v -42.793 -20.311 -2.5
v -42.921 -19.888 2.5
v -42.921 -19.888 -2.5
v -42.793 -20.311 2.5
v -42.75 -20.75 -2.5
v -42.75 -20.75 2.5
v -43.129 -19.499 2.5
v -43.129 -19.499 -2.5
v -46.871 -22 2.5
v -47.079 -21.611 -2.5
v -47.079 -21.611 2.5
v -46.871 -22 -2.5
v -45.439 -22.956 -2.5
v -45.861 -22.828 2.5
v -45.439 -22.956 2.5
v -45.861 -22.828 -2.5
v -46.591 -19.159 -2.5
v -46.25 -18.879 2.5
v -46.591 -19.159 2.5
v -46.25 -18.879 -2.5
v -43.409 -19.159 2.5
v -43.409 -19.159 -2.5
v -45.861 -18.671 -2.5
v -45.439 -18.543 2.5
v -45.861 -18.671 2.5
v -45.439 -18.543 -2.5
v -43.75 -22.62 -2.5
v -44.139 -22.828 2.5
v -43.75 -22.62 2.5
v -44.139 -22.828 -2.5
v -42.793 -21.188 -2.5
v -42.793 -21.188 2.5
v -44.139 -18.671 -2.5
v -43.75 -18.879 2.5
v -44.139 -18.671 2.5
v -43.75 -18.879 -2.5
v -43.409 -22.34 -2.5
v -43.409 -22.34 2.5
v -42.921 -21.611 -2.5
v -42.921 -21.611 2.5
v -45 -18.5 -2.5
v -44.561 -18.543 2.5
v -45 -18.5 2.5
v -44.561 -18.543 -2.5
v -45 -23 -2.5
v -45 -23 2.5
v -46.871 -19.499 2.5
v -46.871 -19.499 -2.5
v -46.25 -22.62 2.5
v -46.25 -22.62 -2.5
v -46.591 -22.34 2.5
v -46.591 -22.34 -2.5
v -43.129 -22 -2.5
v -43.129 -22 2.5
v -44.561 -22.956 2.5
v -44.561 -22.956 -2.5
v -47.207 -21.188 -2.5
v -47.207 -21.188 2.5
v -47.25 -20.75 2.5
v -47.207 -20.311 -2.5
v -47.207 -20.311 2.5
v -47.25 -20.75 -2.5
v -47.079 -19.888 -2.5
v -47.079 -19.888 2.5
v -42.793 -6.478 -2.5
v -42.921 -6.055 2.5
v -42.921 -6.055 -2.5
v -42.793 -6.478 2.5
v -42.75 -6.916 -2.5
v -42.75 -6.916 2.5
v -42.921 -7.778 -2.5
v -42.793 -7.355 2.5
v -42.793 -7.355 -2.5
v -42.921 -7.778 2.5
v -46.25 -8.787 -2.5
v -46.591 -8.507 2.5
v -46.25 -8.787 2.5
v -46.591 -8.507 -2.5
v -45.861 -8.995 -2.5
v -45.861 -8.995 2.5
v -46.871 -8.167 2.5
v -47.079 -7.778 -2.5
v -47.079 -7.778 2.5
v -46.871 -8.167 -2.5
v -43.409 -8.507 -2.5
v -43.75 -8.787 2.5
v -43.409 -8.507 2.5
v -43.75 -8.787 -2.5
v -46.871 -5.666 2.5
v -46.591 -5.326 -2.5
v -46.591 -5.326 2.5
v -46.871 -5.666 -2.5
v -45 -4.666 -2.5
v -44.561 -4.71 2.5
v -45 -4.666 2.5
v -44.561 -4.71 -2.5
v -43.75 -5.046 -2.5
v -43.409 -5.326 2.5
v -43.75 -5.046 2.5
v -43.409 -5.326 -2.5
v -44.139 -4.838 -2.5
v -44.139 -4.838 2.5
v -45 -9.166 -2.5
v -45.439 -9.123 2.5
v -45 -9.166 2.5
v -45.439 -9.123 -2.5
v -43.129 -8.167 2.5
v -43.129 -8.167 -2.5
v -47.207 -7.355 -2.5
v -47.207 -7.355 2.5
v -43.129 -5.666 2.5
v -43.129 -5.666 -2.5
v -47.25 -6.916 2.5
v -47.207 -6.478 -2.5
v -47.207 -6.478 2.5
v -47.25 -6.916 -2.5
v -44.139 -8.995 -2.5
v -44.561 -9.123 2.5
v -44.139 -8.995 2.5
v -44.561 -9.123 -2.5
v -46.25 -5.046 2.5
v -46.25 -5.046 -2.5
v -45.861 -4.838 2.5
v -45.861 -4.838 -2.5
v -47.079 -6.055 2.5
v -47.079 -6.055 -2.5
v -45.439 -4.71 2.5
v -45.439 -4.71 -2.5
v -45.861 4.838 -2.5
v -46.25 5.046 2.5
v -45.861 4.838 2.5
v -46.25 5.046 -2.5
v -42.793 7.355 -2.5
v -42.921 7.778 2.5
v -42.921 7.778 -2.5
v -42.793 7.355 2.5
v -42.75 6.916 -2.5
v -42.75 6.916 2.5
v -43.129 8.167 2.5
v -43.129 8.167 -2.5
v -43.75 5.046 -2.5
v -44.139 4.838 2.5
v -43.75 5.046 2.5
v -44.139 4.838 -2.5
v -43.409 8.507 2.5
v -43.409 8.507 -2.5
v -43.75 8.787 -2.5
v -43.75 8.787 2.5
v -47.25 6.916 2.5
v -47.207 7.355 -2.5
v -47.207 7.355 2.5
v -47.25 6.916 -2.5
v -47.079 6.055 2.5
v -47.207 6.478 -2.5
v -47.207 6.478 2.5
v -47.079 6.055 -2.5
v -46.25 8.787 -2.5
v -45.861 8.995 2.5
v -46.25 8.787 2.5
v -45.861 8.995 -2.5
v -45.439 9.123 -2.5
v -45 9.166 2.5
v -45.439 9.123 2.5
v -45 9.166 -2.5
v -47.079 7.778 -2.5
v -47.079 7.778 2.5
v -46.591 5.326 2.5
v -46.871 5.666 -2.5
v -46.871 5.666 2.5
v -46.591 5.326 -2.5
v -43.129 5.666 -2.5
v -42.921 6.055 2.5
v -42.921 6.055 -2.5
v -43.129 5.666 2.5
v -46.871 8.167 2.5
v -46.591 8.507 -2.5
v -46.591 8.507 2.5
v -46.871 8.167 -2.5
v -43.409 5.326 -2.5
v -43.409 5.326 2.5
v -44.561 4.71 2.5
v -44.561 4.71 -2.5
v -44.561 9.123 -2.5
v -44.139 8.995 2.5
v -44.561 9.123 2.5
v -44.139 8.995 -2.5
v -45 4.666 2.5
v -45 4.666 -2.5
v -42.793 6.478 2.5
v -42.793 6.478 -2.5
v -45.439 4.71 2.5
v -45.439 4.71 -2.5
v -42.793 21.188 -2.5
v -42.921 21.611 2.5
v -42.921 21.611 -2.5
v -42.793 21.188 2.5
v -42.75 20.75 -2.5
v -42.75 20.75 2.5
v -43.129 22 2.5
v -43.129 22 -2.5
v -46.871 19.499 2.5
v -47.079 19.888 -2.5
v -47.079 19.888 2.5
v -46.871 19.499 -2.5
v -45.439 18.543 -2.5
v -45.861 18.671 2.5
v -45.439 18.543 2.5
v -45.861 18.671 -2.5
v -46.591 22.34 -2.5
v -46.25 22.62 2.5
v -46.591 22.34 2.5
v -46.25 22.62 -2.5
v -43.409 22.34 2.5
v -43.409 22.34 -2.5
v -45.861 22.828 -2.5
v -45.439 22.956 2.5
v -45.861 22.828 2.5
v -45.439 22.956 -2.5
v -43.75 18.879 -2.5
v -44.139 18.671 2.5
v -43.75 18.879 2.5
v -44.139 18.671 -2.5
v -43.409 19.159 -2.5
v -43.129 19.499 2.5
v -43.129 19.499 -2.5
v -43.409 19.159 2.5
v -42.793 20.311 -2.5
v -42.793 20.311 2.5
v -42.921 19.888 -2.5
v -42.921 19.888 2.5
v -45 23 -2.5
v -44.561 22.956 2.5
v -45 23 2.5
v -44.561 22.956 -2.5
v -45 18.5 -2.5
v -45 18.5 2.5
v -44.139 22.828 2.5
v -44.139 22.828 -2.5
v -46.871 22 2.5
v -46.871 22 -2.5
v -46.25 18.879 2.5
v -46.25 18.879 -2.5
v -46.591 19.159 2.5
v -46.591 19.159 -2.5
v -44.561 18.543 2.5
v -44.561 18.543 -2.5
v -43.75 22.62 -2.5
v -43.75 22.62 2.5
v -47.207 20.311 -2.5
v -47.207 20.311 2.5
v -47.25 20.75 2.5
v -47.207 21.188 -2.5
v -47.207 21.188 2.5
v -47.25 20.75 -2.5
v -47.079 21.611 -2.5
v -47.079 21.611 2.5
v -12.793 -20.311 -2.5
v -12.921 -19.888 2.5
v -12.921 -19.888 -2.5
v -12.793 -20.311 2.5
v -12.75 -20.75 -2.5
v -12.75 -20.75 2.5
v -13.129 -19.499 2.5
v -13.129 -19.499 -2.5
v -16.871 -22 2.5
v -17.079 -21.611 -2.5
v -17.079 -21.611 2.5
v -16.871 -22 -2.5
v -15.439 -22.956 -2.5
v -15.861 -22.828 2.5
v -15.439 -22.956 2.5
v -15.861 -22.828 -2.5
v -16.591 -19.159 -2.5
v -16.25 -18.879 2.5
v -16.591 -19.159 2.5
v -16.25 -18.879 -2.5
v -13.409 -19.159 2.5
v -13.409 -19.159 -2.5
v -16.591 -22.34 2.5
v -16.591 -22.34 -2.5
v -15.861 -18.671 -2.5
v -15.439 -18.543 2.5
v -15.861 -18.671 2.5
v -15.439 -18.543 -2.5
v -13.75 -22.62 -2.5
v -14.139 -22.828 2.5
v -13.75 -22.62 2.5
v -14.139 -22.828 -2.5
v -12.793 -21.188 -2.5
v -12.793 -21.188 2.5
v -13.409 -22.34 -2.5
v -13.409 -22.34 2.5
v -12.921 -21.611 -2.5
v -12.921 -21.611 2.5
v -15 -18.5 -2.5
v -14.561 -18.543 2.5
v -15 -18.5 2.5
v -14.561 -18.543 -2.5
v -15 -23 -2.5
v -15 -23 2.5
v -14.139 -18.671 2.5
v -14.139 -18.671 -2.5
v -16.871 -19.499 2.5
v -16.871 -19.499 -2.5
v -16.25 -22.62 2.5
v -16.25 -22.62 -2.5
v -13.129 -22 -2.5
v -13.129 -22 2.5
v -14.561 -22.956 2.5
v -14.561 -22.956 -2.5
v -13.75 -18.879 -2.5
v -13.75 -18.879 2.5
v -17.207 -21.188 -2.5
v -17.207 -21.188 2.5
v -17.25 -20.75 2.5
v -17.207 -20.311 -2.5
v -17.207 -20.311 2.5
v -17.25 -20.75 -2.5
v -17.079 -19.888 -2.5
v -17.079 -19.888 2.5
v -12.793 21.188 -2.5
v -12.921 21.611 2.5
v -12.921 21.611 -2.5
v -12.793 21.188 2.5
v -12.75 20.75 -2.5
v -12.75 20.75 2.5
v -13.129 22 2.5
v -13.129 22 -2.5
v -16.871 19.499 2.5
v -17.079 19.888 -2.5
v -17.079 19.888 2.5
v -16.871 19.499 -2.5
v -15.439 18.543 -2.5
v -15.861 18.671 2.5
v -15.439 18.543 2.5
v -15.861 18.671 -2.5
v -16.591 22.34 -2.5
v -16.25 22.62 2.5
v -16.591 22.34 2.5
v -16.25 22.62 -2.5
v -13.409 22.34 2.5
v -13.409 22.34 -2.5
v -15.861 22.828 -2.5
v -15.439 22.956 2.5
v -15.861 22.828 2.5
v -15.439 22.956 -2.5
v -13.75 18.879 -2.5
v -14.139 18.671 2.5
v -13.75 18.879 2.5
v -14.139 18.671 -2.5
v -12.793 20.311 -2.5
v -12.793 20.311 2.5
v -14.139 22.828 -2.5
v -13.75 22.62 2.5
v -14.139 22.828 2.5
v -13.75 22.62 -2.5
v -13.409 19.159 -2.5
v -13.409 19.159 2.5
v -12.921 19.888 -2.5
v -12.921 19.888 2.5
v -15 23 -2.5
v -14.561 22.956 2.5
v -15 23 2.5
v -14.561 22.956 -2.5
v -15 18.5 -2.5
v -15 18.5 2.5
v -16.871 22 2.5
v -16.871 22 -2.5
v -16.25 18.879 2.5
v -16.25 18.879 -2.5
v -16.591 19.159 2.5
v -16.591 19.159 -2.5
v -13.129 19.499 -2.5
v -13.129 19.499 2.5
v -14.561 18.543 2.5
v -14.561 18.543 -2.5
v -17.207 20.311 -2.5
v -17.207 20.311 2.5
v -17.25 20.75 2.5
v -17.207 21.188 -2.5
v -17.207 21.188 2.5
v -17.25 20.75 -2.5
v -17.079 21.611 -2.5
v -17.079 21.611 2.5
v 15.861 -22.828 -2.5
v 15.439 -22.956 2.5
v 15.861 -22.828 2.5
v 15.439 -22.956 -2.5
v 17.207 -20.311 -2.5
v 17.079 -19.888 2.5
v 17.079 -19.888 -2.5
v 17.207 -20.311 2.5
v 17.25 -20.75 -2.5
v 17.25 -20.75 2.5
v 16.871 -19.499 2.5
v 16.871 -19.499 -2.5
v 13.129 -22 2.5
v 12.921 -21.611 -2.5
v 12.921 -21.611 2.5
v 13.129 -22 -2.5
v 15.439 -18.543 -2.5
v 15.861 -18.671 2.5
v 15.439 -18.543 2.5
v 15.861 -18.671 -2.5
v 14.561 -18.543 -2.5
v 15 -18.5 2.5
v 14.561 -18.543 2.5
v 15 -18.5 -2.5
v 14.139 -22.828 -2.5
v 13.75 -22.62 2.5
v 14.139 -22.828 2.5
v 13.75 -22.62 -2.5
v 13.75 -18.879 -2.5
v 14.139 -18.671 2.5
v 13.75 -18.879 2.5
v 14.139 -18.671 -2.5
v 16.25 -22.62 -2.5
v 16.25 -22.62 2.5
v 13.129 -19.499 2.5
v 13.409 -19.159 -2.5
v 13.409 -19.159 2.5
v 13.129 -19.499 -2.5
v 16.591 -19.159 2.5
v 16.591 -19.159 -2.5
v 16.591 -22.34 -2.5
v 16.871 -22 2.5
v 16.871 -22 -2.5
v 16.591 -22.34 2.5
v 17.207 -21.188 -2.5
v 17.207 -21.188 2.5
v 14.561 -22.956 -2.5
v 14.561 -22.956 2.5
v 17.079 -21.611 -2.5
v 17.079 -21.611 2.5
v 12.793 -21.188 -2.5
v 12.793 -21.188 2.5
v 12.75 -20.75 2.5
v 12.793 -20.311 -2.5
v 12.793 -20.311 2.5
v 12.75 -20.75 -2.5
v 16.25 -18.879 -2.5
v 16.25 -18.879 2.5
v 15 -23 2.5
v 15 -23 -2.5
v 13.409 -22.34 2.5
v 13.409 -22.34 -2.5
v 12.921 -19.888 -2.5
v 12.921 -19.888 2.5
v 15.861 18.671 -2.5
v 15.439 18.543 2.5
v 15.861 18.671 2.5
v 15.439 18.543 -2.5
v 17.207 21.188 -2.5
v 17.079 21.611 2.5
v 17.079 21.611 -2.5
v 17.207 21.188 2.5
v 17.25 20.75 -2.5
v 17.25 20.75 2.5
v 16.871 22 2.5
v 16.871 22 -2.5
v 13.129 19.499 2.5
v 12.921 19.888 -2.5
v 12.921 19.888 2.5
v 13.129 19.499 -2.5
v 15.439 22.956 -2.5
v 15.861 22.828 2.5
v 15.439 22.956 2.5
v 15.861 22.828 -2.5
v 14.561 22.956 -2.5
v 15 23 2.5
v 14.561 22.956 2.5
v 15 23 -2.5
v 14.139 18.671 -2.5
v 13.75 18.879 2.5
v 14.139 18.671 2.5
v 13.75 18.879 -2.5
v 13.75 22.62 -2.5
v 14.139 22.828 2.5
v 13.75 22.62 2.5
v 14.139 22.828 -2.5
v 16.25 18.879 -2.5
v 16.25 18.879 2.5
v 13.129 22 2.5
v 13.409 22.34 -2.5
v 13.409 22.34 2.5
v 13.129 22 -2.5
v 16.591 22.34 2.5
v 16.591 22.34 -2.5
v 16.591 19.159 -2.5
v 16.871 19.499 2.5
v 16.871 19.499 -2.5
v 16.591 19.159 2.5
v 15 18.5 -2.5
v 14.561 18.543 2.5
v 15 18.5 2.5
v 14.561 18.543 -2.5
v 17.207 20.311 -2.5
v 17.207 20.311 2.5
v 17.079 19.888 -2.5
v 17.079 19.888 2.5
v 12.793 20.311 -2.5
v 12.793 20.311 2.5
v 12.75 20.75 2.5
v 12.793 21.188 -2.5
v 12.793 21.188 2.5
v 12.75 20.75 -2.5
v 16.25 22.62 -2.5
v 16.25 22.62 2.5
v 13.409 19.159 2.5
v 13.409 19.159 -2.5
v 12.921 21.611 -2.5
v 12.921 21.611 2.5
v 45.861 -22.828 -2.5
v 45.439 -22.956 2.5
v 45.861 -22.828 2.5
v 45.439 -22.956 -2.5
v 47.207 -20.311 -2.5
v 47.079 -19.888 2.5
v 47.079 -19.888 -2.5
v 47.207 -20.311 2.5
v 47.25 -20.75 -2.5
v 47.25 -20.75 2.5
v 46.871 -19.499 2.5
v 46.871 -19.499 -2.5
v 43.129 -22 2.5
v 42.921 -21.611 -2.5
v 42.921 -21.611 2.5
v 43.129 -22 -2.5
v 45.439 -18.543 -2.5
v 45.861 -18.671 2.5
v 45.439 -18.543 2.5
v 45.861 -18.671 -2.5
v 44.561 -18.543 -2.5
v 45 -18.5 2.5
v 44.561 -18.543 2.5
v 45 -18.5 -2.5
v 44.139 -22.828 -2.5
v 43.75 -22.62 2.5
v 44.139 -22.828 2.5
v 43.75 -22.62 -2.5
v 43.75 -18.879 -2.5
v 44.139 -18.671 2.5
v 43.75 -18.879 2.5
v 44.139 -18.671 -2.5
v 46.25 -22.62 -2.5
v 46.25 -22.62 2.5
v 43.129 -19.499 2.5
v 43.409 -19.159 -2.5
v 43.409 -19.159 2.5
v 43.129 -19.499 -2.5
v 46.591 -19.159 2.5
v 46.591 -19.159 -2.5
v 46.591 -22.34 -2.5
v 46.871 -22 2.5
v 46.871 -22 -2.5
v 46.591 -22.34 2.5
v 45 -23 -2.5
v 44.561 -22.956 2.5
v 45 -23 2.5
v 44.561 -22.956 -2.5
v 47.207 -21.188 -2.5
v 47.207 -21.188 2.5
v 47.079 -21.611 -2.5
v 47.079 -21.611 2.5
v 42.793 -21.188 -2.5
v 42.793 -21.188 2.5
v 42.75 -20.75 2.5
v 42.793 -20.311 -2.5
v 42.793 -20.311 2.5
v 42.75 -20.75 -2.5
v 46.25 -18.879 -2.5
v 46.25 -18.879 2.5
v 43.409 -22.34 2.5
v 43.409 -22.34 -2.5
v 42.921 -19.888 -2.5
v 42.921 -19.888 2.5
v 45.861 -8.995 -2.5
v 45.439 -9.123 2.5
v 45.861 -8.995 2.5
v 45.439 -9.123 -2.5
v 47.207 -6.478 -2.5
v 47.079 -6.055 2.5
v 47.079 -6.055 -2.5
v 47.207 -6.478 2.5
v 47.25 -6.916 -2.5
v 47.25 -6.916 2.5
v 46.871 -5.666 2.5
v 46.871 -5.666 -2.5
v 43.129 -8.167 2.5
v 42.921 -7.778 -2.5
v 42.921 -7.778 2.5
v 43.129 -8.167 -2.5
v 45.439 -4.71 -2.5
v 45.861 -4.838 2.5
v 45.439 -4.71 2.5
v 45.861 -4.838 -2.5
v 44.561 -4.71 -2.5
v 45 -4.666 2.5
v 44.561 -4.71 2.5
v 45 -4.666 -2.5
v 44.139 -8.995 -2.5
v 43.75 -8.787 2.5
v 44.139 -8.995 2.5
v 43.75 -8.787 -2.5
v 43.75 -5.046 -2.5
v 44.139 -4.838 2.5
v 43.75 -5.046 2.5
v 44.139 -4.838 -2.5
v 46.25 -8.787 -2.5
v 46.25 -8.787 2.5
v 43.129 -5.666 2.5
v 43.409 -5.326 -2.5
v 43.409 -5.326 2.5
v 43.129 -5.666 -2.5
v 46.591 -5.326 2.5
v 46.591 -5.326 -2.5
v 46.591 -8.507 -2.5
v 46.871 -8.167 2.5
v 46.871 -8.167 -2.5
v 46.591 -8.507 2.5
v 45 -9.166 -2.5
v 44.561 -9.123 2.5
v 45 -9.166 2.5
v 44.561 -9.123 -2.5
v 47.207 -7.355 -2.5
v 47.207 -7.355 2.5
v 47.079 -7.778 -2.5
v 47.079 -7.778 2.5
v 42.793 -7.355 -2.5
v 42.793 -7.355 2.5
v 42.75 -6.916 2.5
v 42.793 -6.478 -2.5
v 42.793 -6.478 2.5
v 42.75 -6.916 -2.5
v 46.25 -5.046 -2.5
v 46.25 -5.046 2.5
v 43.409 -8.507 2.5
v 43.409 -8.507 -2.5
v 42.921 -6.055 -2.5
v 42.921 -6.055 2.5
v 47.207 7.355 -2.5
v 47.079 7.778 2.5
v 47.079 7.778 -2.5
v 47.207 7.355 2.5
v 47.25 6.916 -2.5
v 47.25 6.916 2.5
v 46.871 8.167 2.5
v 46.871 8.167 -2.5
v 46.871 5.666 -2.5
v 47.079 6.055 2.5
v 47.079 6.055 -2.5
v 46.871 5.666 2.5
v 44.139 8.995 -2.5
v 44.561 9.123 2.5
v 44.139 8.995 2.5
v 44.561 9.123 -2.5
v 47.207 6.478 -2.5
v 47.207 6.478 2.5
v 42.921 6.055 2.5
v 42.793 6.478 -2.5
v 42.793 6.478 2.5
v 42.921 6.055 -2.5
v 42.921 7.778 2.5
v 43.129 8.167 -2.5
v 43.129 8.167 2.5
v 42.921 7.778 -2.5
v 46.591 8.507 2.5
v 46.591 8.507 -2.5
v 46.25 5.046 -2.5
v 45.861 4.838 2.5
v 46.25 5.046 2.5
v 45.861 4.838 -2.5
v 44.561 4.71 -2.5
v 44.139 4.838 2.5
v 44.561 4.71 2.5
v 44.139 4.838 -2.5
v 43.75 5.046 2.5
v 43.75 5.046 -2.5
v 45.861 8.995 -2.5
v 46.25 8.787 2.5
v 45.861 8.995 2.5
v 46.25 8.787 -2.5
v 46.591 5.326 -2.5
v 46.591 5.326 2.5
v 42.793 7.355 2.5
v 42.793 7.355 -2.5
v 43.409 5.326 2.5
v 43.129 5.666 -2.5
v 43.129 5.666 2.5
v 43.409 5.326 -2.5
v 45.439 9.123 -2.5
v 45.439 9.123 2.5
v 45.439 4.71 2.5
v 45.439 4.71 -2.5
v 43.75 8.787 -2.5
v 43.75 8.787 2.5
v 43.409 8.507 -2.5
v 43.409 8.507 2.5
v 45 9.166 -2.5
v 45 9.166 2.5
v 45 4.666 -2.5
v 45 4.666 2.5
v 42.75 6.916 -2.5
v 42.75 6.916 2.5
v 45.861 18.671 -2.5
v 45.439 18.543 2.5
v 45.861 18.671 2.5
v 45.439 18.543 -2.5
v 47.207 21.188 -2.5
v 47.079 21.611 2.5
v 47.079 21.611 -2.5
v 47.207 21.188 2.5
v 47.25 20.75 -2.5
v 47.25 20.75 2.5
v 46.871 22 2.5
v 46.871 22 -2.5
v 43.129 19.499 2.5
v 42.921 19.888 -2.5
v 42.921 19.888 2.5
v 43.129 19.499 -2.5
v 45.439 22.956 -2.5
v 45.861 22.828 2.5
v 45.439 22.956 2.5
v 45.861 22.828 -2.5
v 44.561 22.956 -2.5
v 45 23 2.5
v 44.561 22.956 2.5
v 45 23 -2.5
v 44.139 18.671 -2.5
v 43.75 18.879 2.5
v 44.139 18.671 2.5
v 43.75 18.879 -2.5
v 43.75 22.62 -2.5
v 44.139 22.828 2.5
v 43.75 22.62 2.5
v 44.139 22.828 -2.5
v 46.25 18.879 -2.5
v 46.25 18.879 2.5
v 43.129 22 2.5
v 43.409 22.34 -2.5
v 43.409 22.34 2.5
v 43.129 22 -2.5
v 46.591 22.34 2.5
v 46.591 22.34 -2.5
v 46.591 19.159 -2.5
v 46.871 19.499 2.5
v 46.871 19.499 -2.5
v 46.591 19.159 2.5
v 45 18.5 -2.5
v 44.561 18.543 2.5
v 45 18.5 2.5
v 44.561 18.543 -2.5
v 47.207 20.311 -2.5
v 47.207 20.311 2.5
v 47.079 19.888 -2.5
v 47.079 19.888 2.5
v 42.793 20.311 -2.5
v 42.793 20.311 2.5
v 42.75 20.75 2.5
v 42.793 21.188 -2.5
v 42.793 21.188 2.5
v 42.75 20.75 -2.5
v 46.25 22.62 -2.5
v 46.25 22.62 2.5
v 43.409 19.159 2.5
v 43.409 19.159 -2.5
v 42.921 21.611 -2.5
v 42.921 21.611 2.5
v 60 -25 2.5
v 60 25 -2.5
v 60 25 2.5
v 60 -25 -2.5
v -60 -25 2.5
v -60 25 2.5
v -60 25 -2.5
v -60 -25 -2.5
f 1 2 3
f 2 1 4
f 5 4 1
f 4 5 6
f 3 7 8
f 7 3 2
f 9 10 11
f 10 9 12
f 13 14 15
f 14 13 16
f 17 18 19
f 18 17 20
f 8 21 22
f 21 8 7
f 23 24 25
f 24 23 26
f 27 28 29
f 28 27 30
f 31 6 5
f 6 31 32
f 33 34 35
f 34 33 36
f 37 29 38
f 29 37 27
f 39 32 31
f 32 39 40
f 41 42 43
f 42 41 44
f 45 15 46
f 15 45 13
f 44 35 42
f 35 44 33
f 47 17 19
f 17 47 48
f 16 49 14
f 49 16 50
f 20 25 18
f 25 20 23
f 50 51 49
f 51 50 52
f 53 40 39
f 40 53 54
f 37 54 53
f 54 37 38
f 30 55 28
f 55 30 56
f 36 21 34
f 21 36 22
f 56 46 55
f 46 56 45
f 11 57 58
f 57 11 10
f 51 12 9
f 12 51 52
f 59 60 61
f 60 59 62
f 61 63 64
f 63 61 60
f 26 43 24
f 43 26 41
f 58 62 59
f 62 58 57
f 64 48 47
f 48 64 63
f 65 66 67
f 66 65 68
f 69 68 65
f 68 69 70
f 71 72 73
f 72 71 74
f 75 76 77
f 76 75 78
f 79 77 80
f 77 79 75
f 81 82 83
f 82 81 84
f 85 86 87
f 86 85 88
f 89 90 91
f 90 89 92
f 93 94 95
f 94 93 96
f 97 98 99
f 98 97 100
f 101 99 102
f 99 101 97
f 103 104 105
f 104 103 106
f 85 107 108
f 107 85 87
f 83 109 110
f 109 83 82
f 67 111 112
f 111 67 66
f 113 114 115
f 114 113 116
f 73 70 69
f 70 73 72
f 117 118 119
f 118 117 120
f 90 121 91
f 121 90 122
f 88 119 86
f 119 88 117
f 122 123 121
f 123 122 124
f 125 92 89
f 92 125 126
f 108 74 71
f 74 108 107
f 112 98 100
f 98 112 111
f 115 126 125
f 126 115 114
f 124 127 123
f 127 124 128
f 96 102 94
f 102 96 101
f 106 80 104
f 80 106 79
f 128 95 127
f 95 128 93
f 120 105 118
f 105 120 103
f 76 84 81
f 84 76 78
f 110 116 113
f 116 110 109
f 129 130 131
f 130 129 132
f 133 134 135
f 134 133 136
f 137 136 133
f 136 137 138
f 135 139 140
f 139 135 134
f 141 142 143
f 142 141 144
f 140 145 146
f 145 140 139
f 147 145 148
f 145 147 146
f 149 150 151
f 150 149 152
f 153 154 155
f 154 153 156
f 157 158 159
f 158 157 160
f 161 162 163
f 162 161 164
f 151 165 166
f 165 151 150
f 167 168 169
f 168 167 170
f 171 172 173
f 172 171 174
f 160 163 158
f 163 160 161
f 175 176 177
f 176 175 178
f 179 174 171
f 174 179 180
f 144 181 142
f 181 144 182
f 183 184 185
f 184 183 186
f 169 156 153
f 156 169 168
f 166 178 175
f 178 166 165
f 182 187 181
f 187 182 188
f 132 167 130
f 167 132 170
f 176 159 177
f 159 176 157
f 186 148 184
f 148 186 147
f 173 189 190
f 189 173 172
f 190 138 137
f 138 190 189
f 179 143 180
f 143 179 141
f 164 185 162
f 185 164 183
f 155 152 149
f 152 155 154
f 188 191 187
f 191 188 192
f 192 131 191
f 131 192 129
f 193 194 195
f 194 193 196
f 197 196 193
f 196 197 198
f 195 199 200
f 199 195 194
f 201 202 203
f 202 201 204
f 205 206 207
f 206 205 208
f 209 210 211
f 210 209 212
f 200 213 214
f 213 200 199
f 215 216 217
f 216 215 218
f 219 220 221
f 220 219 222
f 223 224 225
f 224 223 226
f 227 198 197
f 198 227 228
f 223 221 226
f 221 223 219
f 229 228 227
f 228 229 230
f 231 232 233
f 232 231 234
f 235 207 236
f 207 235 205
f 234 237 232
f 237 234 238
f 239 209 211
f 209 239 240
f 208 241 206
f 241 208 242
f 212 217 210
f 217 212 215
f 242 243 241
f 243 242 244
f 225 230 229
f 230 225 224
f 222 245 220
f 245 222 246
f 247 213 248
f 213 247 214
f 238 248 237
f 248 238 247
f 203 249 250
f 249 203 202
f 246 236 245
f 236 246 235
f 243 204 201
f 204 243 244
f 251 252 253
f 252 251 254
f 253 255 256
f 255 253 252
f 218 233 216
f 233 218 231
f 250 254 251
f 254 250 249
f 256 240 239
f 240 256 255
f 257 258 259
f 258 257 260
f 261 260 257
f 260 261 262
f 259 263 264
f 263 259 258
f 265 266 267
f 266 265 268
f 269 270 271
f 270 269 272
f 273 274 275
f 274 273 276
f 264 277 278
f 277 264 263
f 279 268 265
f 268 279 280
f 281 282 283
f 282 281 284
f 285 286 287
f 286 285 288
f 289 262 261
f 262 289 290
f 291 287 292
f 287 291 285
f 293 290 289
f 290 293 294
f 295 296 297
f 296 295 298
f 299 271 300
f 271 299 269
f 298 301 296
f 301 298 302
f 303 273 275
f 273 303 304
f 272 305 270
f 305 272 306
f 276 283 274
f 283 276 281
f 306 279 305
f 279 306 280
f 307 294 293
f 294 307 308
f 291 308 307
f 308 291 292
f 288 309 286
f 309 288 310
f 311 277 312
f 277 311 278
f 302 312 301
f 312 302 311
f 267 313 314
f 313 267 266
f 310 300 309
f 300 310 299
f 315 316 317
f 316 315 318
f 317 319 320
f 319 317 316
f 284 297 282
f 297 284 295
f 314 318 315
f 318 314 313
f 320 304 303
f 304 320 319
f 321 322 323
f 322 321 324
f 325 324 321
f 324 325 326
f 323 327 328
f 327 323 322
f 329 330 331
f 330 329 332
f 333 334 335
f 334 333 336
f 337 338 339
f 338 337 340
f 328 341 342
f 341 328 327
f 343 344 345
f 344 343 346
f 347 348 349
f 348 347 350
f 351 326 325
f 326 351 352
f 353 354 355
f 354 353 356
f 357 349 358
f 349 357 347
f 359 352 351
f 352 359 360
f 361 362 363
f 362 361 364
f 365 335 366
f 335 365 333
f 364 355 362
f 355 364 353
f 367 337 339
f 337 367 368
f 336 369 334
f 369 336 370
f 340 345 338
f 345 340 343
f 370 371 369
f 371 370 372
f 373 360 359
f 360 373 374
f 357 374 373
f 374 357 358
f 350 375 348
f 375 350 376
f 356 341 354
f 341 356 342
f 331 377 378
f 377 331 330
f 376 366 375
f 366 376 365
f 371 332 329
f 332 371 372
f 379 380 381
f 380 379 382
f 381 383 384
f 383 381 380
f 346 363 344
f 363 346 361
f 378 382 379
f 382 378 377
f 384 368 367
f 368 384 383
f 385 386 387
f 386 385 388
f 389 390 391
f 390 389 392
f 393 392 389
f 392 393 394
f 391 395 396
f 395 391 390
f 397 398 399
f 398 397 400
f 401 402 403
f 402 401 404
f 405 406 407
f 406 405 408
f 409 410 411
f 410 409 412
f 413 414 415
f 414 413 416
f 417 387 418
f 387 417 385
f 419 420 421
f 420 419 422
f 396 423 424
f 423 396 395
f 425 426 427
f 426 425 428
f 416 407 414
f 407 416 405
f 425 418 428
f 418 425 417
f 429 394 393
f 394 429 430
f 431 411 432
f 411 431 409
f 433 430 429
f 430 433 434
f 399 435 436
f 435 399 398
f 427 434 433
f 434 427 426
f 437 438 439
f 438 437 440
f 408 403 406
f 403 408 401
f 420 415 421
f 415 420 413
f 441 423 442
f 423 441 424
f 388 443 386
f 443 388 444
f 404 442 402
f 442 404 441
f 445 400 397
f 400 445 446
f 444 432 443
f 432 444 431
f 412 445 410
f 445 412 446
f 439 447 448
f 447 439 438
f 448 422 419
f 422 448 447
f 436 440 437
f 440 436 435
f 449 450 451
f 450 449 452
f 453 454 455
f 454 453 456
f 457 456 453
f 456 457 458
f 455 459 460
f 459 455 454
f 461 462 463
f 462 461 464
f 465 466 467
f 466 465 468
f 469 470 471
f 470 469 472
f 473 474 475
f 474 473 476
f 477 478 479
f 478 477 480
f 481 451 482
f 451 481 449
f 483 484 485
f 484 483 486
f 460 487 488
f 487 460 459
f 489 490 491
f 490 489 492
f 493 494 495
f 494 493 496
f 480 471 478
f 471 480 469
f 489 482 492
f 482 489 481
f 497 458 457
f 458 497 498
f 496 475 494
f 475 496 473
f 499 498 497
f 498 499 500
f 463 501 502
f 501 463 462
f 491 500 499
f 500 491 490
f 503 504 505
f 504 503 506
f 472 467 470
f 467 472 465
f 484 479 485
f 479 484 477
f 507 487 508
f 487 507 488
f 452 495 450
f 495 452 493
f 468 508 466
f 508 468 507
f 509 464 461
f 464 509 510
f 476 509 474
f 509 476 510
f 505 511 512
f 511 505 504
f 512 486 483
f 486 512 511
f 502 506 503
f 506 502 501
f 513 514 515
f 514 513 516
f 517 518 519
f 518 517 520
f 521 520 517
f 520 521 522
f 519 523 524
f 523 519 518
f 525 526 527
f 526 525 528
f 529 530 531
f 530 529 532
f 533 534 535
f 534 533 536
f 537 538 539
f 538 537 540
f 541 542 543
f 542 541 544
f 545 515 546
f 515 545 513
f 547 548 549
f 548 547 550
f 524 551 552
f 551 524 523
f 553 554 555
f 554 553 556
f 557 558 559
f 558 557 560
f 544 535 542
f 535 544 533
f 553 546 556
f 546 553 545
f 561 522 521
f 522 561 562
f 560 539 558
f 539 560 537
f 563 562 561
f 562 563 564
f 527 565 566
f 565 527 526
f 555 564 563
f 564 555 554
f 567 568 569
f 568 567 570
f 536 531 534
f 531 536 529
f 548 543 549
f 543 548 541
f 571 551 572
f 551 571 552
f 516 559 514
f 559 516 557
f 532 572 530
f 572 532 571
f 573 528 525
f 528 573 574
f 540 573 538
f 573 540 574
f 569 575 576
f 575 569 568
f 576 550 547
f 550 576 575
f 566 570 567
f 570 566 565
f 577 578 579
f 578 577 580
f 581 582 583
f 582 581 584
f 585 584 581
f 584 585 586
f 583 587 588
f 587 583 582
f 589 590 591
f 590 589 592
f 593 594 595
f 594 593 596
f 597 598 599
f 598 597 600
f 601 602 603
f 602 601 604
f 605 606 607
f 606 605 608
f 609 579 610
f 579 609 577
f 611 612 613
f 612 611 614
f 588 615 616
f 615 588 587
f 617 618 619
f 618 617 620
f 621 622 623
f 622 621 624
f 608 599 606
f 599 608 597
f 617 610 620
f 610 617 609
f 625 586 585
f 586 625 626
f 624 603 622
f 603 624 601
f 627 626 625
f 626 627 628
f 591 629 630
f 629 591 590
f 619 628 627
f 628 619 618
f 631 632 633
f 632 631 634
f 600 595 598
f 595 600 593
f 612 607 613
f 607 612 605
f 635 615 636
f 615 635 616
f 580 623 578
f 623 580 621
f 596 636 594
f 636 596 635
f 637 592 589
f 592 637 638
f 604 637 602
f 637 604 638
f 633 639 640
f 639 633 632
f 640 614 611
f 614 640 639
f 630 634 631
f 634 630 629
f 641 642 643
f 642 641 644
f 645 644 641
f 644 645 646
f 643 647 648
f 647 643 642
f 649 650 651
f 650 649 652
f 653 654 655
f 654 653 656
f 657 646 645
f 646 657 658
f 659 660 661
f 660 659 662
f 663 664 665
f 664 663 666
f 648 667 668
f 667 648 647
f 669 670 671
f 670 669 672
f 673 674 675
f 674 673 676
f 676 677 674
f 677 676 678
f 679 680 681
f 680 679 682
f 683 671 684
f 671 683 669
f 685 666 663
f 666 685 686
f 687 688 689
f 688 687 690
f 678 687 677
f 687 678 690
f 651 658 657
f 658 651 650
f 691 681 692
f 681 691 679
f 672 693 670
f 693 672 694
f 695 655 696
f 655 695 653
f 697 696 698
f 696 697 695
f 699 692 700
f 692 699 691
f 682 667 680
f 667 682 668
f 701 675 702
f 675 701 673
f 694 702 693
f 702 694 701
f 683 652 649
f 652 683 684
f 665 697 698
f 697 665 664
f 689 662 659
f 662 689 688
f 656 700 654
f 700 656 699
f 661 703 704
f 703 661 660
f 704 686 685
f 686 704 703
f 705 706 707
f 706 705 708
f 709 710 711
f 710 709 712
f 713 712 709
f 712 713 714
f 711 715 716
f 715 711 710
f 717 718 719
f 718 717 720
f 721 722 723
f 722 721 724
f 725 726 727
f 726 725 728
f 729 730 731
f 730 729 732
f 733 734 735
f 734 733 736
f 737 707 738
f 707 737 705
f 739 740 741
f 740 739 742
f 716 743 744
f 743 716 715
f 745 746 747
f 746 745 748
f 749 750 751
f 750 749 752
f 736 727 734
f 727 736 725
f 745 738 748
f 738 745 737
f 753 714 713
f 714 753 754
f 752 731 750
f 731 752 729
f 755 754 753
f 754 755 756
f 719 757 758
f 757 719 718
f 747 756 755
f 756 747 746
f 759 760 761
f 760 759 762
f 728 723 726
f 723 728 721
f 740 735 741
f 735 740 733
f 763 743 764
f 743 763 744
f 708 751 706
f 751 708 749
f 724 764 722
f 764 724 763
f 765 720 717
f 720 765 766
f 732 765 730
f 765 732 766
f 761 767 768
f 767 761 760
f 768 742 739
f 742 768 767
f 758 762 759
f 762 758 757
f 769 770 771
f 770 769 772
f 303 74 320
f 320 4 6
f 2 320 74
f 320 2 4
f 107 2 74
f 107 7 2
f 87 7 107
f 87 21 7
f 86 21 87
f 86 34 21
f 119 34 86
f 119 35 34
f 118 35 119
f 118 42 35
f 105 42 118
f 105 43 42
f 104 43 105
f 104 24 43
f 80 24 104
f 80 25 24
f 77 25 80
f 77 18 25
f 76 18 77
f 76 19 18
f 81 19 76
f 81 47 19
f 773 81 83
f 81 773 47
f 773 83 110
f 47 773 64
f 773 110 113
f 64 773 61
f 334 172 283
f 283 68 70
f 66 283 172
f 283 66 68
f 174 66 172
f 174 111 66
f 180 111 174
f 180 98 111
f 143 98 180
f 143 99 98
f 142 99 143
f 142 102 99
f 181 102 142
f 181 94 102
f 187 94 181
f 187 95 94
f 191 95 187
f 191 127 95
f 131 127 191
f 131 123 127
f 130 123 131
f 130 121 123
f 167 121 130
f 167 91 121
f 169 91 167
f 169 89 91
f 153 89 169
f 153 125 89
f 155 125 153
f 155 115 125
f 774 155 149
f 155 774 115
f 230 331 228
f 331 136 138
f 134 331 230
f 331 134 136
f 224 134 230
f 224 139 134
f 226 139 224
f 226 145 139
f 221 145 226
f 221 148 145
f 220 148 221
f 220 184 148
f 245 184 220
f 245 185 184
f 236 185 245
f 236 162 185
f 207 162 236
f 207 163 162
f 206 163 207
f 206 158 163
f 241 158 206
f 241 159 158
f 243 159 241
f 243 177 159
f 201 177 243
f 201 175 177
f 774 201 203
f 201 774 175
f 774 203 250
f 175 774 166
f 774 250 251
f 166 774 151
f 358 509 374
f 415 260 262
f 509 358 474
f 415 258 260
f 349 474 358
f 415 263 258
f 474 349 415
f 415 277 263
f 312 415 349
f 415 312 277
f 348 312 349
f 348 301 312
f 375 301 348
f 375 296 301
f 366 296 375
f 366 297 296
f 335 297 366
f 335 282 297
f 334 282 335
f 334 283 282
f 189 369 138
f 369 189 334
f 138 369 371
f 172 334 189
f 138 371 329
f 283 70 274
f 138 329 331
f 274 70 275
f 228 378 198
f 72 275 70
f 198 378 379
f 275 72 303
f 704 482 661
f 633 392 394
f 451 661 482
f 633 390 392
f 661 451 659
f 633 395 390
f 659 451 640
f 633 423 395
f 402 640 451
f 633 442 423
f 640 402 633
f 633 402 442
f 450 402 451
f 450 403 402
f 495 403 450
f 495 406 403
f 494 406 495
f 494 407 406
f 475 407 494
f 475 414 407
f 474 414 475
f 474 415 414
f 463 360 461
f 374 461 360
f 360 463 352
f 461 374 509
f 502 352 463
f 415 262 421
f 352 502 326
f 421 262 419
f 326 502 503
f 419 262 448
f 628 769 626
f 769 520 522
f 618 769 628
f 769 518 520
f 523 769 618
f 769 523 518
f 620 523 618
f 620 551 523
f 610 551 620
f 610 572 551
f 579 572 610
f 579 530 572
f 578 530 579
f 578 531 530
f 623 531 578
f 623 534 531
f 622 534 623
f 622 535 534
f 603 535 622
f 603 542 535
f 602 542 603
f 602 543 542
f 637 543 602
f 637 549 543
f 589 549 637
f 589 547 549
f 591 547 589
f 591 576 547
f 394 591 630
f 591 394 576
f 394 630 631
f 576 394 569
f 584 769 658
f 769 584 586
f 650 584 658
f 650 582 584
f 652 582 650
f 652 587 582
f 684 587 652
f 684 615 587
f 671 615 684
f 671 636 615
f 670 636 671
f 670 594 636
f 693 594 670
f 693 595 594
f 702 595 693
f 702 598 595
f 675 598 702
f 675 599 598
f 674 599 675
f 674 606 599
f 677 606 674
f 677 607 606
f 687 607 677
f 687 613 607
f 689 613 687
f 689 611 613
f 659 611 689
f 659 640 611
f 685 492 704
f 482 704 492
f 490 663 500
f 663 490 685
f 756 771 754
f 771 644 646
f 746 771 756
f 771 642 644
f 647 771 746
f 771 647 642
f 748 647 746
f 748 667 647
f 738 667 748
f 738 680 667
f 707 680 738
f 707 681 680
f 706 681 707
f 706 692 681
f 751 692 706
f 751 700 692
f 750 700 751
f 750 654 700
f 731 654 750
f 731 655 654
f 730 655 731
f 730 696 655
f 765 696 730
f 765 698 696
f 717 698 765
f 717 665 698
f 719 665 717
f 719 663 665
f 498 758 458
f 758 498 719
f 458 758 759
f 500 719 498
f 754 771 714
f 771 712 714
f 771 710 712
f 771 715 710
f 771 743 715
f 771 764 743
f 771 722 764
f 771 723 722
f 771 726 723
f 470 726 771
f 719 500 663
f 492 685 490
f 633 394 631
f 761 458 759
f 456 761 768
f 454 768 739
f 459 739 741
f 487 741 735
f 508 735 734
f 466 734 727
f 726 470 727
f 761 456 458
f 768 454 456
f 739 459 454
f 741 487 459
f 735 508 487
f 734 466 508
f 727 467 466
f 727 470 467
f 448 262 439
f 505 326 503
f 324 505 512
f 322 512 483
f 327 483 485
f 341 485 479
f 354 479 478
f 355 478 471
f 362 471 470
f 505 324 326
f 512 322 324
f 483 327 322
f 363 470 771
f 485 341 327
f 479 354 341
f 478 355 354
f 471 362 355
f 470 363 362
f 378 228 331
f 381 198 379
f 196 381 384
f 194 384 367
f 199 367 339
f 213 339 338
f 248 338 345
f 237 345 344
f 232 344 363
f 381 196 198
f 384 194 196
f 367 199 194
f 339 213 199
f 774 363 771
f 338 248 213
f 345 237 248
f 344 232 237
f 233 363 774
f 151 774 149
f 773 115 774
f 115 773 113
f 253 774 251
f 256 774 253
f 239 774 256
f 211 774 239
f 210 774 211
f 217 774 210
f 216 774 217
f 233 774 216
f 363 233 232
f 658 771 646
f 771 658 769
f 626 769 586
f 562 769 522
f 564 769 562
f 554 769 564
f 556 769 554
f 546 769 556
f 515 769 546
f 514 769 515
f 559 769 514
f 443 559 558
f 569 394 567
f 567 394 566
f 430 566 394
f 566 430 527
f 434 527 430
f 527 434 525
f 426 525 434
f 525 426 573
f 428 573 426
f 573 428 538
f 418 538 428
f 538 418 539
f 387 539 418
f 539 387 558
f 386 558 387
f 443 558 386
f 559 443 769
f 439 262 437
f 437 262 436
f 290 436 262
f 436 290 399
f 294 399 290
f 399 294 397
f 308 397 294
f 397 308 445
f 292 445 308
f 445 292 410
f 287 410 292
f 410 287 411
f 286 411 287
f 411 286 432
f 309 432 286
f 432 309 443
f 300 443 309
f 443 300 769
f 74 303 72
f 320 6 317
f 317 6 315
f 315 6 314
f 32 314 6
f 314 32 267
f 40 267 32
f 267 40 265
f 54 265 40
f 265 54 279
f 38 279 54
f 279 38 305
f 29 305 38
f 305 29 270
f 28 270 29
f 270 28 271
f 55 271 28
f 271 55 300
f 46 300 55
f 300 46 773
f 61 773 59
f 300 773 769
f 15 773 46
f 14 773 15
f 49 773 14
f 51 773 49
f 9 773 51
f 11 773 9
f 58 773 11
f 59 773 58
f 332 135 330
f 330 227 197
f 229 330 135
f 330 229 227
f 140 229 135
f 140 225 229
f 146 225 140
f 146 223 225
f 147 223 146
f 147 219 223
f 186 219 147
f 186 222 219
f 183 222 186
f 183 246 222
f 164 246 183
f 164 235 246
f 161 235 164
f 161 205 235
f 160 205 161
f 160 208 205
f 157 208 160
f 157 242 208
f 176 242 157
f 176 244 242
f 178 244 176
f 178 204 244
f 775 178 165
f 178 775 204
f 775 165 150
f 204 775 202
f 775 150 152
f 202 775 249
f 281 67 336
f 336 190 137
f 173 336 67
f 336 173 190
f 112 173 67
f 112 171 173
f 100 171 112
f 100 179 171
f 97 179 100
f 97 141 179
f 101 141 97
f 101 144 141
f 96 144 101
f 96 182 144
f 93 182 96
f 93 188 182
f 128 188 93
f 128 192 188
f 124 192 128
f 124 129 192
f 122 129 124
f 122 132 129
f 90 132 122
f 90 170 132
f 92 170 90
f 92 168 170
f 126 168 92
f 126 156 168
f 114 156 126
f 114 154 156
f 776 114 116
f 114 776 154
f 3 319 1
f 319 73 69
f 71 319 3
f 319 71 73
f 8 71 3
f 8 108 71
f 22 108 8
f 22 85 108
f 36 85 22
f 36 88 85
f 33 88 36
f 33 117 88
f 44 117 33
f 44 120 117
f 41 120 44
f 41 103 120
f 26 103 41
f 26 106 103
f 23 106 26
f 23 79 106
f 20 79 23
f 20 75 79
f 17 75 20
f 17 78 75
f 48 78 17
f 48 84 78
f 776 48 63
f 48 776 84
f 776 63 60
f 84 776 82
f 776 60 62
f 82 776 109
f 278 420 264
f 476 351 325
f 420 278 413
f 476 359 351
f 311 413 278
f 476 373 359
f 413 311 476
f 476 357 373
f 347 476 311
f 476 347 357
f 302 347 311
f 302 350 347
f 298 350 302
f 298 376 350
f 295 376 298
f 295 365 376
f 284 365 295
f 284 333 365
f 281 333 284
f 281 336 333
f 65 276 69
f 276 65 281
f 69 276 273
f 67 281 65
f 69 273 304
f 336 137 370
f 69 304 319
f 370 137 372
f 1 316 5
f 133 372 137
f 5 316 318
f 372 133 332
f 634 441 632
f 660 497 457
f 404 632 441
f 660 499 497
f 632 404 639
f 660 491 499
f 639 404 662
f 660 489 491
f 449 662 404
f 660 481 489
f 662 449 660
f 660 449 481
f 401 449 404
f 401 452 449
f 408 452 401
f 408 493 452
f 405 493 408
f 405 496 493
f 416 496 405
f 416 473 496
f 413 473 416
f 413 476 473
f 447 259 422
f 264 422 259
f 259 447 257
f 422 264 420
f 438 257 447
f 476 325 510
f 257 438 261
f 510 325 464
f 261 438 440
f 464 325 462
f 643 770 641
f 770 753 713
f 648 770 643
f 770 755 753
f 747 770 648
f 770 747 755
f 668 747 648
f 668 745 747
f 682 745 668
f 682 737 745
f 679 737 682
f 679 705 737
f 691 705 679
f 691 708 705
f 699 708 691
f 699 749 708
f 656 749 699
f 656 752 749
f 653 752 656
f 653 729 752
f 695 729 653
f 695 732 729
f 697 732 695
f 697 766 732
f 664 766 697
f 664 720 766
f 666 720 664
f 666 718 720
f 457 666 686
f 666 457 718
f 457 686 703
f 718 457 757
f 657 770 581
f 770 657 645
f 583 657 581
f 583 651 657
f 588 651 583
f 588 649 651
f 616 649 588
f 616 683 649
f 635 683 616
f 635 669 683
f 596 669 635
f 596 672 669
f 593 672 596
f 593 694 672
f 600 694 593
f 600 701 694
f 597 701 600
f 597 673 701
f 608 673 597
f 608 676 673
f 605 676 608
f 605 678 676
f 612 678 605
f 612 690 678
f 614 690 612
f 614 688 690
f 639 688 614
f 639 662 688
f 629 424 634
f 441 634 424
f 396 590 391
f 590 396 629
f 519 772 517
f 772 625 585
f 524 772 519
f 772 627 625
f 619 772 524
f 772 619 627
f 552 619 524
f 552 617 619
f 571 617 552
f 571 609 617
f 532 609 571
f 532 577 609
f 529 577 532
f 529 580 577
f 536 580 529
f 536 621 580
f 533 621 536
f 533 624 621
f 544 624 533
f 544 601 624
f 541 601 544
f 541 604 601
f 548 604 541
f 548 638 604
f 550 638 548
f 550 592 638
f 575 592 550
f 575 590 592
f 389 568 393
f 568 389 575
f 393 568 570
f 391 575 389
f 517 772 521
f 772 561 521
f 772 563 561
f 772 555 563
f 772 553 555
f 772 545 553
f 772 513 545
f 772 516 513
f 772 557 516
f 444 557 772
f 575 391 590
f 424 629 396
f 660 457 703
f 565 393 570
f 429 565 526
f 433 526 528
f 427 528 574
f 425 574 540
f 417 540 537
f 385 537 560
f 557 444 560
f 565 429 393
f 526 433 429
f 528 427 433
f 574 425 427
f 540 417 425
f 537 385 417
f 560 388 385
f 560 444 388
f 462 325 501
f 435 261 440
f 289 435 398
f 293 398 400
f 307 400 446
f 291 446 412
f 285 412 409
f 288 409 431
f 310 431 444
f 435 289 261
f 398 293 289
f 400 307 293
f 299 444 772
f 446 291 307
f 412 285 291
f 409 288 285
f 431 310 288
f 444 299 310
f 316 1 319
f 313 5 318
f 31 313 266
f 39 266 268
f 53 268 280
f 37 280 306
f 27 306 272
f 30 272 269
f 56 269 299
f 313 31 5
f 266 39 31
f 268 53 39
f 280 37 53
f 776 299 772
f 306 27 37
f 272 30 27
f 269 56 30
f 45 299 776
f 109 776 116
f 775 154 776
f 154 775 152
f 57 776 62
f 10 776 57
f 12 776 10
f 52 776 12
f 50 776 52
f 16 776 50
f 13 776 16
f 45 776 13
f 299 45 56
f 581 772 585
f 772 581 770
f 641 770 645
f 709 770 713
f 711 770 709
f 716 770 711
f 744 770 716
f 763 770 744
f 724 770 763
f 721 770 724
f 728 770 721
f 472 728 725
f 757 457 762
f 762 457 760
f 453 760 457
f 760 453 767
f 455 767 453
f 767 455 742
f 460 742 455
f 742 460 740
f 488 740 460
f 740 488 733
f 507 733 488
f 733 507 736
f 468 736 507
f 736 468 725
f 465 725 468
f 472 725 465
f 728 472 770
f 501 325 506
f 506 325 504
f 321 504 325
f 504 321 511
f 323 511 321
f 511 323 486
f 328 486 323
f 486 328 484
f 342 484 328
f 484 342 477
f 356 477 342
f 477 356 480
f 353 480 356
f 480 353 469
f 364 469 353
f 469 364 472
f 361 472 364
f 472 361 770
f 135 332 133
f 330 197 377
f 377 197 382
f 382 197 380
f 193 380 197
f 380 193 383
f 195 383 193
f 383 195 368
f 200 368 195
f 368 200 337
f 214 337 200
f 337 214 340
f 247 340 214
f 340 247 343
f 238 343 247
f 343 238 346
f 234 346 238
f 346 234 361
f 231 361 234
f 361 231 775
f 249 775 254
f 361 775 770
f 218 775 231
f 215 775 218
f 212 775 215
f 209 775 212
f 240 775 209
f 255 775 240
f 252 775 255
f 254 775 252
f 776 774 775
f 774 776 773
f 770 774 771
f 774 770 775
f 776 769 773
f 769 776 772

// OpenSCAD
$fn = 32;

// ----------------------------------------------------------------------
// Perforated panel 120 x 50 x 5
// 4 x 4 Ø4.5 holes, frame layout
// ----------------------------------------------------------------------

// --- parameters (mm) ---
panel = [120, 50, 5];  // overall size (x, y, z)
hole_d = 4.5;          // hole diameter
pitch_x = 30;          // hole pitch along X
pitch_y = 13.833;      // hole pitch along Y

// --- derived feature positions (mm) ---
margin = hole_d / 2 + 2;            // = 4.25   clearance from the panel edge
cols = floor((panel[0] - 2 * margin) / pitch_x) + 1;  // = 4   how many columns fit in X
rows = floor((panel[1] - 2 * margin) / pitch_y) + 1;  // = 4   how many rows fit in Y
span_x = (cols - 1) * pitch_x + 0;  // = 90   width of the field
span_y = (rows - 1) * pitch_y;      // = 41.5   height of the field
origin_x = -span_x / 2;             // = -45   X of the first hole
origin_y = -span_y / 2;             // = -20.75   Y of the first row
holes = 2 * cols + 2 * (rows - 2);  // = 12   holes around the frame
feature_centers = [
  [origin_x + 0 * pitch_x, origin_y + 0 * pitch_y],
  [origin_x + 0 * pitch_x, origin_y + 1 * pitch_y],
  [origin_x + 0 * pitch_x, origin_y + 2 * pitch_y],
  [origin_x + 0 * pitch_x, origin_y + 3 * pitch_y],
  [origin_x + 1 * pitch_x, origin_y + 0 * pitch_y],
  [origin_x + 1 * pitch_x, origin_y + 3 * pitch_y],
  [origin_x + 2 * pitch_x, origin_y + 0 * pitch_y],
  [origin_x + 2 * pitch_x, origin_y + 3 * pitch_y],
  [origin_x + 3 * pitch_x, origin_y + 0 * pitch_y],
  [origin_x + 3 * pitch_x, origin_y + 1 * pitch_y],
  [origin_x + 3 * pitch_x, origin_y + 2 * pitch_y],
  [origin_x + 3 * pitch_x, origin_y + 3 * pitch_y]
];   // hole centres, used verbatim by the cutter loop

// panel outline, every hole through
difference() {
  cube(panel, center = true);
  for (centre = feature_centers)
    translate([centre[0], centre[1], 0])
      cylinder(d = hole_d, h = panel[2] + 2, center = true);
}
